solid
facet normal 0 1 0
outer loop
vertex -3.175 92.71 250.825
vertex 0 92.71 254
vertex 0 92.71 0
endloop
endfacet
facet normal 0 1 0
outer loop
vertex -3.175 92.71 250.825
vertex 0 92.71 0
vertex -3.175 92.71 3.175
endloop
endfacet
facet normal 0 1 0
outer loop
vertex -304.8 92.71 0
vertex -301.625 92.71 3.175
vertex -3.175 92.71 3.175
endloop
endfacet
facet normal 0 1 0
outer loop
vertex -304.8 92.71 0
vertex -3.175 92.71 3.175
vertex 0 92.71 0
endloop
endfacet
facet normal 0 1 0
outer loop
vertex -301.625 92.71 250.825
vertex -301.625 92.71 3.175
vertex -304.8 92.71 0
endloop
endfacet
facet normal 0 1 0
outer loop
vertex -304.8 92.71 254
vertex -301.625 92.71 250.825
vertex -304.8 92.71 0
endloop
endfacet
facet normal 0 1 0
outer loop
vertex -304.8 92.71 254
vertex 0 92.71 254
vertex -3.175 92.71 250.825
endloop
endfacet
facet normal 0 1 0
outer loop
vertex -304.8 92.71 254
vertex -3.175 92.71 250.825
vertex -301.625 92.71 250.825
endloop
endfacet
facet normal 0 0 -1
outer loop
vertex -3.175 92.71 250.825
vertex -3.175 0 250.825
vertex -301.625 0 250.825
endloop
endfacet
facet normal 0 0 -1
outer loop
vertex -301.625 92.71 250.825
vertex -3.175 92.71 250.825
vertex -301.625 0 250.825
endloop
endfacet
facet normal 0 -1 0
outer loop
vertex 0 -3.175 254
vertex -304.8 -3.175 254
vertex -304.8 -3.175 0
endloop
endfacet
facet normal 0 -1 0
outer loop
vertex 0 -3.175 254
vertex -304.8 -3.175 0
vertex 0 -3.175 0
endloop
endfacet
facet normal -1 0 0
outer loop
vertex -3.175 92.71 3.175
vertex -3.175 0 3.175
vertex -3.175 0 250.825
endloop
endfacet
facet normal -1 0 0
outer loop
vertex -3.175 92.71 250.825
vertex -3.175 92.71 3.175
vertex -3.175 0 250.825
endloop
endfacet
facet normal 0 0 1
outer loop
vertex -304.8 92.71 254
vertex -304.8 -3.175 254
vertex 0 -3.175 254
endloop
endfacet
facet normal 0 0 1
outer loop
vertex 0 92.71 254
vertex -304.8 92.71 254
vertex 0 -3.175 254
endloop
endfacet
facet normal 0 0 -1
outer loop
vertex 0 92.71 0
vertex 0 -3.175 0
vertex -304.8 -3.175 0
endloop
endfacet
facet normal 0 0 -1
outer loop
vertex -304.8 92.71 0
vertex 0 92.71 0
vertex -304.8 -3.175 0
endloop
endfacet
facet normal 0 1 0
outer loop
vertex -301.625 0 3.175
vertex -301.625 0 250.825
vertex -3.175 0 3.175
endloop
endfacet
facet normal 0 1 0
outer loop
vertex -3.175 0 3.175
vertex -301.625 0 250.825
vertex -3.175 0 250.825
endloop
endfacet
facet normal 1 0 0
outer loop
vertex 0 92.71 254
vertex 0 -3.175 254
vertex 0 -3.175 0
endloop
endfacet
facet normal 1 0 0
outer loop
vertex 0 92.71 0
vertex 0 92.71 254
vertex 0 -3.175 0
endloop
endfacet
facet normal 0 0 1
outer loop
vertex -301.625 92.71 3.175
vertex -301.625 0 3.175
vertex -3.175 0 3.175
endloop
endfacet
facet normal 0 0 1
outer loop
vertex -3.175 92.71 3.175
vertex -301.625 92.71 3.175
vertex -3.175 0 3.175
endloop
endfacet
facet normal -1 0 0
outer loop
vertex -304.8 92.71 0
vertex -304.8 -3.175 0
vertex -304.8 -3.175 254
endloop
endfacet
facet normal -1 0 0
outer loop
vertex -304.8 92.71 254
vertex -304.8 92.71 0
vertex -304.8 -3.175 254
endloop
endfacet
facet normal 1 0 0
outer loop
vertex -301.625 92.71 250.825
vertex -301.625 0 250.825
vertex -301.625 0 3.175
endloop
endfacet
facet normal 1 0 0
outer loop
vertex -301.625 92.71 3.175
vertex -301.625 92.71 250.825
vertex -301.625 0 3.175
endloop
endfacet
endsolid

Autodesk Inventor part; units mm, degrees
ref_plane "YZ Plane" through (0, 0, 0) normal (1, 0, 0) x (0, 1, 0)
ref_plane "XZ Plane" through (0, 0, 0) normal (0, 1, 0) x (-1, 0, 0)
ref_plane "XY Plane" through (0, 0, 0) normal (0, 0, 1) x (1, 0, 0)
sketch "Sketch1" plane through (0, 0, 0) normal (0, 1, 0) x (-1, 0, 0)
  line L0 (0, 0) -> (304.8, 0)
  line L1 (304.8, 0) -> (304.8, 254)
  line L2 (304.8, 254) -> (0, 254)
  line L3 (0, 254) -> (0, 0)
  line L4 (301.625, 250.825) -> (301.625, 3.175)
  line L5 (301.625, 3.175) -> (3.175, 3.175)
  line L6 (3.175, 3.175) -> (3.175, 250.825)
  line L7 (3.175, 250.825) -> (301.625, 250.825)
  dimension "d0" = 304.8
  dimension "d1" = 254
  dimension "d21" = 3.175
extrude "Extrusion1" add sketch "Sketch1" along normal blind 92.71
sketch "Sketch5" plane through (0, 0, 0) normal (0, -1, 0) x (1, 0, 0)
  line L0 (0, 0) -> (-304.8, 0)
  line L1 (-304.8, 0) -> (-304.8, 254)
  line L2 (-304.8, 254) -> (0, 254)
  line L3 (0, 254) -> (0, 0)
  dimension "d22" = 304.8
  dimension "d23" = 254
extrude "Extrusion4" add sketch "Sketch5" along normal blind 3.175
properties part number "Lower Chassis"
